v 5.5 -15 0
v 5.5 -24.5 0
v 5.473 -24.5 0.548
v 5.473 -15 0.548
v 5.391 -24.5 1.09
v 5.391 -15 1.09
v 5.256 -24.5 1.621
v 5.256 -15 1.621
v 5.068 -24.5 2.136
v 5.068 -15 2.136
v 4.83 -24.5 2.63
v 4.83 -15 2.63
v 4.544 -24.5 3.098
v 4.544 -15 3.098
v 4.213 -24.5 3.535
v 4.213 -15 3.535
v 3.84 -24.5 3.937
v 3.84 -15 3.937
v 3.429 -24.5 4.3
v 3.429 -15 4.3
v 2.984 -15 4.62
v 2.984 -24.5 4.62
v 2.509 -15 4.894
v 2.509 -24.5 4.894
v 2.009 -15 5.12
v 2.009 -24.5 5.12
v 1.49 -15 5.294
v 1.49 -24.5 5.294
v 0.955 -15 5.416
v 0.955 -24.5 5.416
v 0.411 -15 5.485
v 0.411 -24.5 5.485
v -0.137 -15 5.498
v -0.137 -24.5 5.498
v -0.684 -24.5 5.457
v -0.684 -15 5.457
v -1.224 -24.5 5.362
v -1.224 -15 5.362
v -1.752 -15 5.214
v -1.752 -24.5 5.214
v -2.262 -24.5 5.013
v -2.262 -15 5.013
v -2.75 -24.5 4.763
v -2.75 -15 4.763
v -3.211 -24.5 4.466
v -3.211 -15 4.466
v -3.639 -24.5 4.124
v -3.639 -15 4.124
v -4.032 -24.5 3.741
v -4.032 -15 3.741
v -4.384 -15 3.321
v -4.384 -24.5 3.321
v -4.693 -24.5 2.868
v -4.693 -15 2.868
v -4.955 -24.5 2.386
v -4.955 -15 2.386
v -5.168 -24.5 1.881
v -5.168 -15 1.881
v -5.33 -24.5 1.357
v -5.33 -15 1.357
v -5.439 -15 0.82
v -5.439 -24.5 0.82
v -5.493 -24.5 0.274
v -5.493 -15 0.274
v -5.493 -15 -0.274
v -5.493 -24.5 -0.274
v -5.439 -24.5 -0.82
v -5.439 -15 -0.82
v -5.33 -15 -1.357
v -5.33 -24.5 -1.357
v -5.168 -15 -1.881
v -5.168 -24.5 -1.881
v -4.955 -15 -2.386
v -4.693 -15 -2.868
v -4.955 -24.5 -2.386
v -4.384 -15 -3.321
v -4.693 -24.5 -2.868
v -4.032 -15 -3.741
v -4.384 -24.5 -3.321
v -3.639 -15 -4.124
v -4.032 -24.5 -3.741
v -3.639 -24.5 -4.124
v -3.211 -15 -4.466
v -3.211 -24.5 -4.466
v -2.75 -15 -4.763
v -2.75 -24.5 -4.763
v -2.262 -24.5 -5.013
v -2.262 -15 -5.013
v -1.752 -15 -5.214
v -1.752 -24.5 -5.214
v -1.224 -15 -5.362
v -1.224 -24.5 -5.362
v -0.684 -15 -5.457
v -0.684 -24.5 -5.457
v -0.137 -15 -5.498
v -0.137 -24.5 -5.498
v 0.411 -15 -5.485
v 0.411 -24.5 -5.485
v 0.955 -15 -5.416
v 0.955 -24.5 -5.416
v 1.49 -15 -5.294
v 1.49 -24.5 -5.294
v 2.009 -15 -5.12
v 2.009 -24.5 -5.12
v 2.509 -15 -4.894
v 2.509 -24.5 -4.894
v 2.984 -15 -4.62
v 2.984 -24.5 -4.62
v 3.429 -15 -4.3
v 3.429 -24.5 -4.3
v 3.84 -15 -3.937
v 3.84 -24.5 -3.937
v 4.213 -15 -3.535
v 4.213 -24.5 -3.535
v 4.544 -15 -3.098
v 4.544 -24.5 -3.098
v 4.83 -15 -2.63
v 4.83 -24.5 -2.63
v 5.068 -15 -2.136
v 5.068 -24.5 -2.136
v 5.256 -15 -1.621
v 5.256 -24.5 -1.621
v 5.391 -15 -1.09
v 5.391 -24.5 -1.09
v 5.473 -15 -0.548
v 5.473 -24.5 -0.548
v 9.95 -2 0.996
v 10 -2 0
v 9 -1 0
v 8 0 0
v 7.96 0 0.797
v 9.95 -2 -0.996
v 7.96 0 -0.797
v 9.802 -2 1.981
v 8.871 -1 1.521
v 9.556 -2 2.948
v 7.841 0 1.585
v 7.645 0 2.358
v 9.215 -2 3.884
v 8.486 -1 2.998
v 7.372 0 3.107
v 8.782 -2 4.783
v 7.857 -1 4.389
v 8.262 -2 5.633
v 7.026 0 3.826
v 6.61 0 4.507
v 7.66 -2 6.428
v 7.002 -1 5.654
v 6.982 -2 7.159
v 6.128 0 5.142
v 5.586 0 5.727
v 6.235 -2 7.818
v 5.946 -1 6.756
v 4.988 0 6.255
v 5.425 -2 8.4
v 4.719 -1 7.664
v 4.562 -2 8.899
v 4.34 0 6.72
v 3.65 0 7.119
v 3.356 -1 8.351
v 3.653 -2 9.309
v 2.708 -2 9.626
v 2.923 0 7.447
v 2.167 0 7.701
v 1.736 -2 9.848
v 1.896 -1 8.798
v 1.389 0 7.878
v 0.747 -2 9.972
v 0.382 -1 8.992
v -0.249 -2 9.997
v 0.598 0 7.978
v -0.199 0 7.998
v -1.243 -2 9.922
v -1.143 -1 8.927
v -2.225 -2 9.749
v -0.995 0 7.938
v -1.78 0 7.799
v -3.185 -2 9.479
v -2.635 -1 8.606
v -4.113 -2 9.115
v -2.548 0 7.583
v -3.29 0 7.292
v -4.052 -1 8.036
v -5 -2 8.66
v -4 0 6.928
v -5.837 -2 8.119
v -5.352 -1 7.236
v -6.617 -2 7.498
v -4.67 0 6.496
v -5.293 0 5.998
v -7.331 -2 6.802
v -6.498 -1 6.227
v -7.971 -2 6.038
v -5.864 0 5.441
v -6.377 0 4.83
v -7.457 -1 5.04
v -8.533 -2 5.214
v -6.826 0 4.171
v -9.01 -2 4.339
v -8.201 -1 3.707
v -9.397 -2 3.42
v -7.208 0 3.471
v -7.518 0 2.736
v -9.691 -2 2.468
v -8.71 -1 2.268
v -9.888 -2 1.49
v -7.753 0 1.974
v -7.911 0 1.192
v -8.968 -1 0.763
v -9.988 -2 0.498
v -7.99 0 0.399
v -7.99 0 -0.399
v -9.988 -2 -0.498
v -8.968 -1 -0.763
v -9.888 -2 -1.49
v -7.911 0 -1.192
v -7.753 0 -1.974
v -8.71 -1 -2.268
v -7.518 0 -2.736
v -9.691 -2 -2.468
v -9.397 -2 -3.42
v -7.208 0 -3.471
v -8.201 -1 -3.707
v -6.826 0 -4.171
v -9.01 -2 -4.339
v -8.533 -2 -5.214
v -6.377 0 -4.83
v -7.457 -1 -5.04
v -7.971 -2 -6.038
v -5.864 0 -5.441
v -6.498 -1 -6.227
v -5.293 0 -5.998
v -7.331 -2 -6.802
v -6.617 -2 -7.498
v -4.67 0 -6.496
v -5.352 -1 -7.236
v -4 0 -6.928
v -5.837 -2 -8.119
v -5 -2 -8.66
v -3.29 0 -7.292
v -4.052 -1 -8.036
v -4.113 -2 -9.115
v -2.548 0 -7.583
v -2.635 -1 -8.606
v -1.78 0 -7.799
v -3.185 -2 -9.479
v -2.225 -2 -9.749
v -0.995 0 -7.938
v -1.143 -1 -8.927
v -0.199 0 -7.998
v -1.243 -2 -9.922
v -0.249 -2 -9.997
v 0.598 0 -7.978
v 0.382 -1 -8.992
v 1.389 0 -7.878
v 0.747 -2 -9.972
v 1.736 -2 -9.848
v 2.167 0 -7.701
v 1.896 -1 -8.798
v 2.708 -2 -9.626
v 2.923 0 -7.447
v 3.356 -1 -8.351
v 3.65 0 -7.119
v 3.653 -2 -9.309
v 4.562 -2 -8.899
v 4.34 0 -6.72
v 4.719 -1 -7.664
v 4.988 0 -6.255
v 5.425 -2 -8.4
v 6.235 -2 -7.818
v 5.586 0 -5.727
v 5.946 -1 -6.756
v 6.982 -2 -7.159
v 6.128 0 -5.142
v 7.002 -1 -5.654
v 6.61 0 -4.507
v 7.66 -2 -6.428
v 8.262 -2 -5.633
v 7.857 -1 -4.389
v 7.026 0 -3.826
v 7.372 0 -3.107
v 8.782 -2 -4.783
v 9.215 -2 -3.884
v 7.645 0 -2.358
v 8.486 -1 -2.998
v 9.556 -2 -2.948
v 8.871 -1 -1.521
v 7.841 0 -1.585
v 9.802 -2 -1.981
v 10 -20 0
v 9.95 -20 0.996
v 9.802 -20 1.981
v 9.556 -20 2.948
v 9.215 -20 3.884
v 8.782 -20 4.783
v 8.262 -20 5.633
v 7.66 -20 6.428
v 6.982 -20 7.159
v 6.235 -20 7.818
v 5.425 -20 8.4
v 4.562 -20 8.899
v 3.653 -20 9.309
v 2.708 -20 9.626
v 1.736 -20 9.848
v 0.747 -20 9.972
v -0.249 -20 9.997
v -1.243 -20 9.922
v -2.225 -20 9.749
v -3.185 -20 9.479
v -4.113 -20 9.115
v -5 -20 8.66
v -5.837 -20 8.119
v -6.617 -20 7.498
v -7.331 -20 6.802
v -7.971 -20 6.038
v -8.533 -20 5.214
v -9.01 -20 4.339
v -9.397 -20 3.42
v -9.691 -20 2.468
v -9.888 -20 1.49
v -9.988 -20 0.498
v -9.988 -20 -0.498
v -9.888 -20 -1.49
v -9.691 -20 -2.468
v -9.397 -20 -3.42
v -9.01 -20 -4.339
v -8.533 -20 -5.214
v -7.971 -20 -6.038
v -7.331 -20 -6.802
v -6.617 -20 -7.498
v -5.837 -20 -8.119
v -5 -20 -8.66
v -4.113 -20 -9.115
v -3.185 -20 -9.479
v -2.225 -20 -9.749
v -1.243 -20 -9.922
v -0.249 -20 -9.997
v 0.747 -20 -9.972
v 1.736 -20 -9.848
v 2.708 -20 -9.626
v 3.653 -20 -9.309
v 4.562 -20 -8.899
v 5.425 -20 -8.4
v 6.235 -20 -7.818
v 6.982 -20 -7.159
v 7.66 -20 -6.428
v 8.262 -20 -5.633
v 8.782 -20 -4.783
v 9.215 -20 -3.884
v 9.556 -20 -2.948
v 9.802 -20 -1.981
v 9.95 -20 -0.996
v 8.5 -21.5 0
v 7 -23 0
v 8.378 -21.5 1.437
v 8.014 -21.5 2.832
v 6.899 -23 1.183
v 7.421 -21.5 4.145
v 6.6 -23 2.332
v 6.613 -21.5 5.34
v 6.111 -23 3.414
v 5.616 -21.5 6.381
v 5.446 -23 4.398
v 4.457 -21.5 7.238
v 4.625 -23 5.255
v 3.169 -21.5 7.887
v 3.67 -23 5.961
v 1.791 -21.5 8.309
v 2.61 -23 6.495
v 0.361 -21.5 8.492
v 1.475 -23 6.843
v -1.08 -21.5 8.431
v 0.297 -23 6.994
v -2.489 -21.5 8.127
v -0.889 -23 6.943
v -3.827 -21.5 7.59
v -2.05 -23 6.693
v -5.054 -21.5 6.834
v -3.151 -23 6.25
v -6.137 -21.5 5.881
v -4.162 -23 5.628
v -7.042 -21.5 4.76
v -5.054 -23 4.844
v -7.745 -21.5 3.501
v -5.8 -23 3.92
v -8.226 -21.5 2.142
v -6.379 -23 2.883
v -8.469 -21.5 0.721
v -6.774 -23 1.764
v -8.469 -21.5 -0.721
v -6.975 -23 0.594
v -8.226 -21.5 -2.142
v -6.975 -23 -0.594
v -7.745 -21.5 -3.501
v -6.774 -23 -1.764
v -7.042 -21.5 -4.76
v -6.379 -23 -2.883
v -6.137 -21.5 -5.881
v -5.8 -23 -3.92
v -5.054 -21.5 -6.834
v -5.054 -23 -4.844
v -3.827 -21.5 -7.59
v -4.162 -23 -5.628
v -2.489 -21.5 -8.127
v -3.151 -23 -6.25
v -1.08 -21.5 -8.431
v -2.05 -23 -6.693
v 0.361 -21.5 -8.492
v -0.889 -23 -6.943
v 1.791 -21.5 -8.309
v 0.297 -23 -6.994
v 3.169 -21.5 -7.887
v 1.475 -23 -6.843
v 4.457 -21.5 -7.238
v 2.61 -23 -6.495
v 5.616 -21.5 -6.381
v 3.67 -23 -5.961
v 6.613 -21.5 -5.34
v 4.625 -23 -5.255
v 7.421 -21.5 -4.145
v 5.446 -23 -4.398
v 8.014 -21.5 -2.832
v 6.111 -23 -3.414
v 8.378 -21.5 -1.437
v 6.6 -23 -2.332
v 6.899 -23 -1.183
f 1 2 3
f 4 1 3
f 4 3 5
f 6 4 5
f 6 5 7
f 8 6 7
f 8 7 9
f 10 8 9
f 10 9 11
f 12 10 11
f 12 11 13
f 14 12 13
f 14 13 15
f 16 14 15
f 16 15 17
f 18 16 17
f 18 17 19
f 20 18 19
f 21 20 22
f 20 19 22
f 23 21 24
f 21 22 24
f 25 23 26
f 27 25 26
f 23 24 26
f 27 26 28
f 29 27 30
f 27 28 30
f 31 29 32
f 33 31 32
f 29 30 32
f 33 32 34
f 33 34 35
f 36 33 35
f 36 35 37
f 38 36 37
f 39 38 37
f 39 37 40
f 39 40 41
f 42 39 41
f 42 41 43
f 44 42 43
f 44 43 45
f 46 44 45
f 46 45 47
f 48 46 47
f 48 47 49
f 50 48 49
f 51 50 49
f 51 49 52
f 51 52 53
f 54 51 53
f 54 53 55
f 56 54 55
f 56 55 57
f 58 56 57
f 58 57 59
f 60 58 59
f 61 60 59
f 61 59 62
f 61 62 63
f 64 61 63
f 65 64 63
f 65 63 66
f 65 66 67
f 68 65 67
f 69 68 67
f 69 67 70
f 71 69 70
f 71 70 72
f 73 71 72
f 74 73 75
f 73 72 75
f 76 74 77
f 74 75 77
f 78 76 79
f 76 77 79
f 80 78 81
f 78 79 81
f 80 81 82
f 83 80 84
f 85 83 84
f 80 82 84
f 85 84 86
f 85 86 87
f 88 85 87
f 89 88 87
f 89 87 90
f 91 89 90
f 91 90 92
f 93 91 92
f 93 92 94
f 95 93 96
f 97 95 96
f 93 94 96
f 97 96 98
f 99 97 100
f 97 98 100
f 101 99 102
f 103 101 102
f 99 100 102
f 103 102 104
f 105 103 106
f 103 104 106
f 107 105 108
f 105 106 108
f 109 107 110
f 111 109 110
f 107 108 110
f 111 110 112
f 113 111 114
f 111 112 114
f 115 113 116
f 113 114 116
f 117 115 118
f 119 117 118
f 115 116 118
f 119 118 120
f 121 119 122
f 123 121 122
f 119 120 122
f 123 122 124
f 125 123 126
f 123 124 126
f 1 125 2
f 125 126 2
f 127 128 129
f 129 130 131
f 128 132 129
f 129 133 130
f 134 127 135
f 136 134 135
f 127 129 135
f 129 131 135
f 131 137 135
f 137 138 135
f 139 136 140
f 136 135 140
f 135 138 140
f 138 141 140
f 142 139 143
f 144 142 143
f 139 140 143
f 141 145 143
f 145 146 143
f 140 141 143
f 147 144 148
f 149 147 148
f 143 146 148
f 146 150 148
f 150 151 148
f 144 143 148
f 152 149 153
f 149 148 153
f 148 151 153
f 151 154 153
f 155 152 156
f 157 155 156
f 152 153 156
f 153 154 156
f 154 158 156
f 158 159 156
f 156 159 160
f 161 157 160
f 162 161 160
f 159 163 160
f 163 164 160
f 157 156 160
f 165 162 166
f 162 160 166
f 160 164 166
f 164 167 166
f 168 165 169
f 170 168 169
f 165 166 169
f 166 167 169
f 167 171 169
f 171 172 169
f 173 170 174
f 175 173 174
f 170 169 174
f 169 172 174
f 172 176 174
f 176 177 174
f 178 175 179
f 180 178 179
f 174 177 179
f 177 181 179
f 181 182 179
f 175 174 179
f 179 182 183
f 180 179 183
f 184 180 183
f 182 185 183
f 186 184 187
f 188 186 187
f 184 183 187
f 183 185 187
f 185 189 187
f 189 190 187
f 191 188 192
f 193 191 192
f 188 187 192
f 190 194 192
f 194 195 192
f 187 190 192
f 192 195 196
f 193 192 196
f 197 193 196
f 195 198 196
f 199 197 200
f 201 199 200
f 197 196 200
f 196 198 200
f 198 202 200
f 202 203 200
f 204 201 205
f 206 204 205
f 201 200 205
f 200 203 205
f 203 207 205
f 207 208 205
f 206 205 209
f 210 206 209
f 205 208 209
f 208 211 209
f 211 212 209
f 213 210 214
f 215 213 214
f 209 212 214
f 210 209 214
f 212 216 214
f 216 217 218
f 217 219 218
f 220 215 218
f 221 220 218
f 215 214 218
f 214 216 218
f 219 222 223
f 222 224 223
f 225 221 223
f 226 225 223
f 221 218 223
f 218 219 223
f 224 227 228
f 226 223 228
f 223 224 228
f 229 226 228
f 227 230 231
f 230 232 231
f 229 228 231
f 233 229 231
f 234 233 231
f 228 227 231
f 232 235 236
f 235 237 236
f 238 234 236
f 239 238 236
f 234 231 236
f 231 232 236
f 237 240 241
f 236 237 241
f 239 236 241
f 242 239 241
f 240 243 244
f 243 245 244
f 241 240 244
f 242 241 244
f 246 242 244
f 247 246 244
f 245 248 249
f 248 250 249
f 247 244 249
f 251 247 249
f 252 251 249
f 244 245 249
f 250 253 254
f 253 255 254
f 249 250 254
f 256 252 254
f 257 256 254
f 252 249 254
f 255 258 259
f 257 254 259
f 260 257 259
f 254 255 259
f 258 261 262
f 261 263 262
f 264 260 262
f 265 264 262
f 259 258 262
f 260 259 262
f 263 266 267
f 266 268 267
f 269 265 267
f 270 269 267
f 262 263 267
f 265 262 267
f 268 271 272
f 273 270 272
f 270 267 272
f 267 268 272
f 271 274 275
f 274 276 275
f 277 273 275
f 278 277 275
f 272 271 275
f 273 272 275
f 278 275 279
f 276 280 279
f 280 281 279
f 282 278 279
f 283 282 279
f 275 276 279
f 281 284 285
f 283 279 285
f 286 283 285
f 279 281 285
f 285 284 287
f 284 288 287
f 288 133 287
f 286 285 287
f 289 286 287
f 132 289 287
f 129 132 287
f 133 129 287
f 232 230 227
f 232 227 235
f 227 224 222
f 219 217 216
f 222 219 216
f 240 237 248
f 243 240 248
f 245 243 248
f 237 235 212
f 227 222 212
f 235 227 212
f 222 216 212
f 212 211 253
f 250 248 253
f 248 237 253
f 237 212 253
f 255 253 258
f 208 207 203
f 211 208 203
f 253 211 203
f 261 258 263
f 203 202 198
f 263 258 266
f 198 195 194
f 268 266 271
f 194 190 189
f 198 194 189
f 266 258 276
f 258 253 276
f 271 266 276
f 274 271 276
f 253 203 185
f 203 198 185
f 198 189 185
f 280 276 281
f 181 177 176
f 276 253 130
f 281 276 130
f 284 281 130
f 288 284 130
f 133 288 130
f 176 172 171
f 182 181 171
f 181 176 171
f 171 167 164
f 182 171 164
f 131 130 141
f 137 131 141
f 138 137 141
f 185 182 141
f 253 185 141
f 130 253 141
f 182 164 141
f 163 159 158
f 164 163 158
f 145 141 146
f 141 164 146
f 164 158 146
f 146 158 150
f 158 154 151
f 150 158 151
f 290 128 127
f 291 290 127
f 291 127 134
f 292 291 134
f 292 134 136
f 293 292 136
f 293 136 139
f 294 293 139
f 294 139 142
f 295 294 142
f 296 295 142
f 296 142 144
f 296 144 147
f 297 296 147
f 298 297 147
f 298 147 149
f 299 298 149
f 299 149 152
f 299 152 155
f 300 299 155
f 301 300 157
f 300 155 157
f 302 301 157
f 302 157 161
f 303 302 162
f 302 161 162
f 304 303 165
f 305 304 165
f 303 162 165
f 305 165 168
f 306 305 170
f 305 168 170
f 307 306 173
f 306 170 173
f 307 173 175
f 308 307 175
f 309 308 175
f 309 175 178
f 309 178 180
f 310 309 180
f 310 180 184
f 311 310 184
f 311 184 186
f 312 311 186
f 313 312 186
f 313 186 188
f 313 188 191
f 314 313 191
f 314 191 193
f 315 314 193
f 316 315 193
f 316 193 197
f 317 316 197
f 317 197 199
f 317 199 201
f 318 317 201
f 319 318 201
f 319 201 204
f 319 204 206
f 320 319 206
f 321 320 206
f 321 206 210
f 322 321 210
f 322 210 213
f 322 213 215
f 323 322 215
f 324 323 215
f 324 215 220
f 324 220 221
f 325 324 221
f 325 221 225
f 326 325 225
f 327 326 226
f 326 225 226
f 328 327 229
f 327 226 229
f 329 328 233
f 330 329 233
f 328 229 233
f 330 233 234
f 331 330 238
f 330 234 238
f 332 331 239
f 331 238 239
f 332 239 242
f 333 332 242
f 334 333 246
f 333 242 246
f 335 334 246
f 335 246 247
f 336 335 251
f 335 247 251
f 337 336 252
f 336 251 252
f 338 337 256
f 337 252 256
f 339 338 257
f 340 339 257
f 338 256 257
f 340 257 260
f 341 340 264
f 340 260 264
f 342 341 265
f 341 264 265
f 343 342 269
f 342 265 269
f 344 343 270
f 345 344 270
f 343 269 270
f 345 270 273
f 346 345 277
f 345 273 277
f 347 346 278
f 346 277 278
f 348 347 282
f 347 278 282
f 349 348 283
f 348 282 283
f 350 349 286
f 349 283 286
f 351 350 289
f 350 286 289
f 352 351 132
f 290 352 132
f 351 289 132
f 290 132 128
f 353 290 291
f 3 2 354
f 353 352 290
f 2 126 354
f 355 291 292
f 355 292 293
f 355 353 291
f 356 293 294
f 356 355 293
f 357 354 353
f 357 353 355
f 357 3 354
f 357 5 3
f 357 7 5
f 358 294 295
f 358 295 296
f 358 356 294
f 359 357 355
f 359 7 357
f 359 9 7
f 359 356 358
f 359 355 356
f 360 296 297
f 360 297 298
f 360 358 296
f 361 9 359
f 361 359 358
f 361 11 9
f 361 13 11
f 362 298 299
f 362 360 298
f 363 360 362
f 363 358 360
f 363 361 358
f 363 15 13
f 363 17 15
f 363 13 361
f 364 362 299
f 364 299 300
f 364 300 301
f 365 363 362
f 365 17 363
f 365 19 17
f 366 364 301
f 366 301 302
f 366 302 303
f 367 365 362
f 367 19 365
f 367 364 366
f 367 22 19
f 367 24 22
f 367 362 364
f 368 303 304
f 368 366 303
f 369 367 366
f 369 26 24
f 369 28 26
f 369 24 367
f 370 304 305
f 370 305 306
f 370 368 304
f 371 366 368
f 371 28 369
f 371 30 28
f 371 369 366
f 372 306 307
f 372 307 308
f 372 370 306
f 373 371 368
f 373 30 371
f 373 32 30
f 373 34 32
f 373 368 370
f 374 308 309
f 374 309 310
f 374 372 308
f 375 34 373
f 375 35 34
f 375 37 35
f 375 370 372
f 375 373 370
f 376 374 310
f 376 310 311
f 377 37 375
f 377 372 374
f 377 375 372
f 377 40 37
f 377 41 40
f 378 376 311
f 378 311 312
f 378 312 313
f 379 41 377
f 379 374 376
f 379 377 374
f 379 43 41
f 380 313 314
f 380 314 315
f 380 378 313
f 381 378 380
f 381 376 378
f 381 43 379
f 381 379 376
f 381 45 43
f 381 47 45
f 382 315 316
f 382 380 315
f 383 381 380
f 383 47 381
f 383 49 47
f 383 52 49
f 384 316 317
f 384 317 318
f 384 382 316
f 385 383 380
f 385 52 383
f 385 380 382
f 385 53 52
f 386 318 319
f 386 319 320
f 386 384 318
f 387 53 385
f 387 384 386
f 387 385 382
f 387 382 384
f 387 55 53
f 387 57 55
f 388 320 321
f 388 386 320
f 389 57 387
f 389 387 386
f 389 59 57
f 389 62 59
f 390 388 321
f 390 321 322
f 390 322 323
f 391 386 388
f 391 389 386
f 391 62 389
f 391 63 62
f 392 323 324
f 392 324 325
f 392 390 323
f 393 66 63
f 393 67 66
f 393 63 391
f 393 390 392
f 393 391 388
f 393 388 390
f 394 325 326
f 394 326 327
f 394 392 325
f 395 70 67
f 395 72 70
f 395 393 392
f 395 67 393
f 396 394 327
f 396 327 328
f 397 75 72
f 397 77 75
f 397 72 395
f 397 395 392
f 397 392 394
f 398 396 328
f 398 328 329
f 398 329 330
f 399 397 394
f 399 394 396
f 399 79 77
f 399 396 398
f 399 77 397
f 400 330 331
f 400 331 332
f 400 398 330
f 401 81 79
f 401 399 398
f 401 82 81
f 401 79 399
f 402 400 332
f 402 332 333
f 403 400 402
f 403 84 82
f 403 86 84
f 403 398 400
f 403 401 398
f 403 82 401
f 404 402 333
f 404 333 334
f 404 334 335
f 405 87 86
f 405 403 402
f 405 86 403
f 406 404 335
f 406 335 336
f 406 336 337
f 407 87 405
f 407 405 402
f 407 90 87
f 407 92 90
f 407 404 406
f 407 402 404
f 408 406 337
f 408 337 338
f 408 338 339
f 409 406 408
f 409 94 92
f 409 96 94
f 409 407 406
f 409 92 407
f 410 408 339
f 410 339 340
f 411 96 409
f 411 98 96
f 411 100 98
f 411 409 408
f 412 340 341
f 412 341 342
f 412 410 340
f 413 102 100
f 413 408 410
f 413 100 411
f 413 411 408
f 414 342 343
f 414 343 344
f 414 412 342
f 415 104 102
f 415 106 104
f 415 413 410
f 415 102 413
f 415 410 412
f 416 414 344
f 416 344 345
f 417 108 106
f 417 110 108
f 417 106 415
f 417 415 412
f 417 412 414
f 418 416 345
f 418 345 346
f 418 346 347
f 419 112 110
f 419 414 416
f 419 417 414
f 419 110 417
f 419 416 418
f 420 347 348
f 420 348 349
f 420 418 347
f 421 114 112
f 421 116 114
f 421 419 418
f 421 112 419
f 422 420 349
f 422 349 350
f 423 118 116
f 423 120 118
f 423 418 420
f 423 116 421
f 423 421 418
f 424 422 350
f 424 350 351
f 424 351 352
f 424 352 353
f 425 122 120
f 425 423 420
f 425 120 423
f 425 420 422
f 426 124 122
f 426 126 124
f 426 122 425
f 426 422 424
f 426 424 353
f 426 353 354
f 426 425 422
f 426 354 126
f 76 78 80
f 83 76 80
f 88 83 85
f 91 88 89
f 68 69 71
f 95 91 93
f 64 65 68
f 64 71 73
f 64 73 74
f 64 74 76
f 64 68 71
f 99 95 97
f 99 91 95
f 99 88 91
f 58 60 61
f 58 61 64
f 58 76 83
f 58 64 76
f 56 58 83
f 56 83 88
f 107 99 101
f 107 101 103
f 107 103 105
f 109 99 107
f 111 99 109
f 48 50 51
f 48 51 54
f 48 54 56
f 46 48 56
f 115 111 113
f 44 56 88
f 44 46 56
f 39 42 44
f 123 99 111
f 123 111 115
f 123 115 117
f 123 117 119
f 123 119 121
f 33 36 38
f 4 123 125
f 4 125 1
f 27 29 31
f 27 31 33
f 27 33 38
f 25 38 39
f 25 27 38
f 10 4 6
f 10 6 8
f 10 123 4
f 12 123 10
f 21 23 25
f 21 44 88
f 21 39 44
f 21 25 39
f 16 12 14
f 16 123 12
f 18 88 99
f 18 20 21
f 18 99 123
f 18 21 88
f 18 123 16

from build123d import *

# Parameters (mm, degrees)
F0_R     = 10
F1_DEPTH = 25
F2_R     = 5.5
F3_DEPTH = 10
F4_SIZE  = 2


# Not quite as in the source:
# - a fillet or chamfer that OpenCascade refuses, or shapes differently, is made with other operations: its cross-section is extruded or revolved along the edge and cut away or added


with BuildPart() as f1:
    # F0 (on Front) → F1 (new body)
    with BuildSketch(Plane.XZ):
        Circle(F0_R)
    extrude(amount=F1_DEPTH)

    # F2 (on face) → F3 (cut)
    with BuildSketch(Plane.XZ.offset(25)):
        Circle(F2_R)
    extrude(amount=-F3_DEPTH, mode=Mode.SUBTRACT)

    # F4
    f4_edges = [f1.edges().sort_by_distance(p)[0] for p in [
        (-10, 0, 0),
    ]]
    chamfer(f4_edges, length=F4_SIZE)

    # F5: chamfer of 5 on 1 edges, made by hand

    # F5_s1 → F5_t2 (revolve, cut)
    with BuildSketch(Plane.XY):
        Polygon((10, -20), (5, -25), (10, -25), align=None)
    revolve(axis=Axis((0, -25, 0), (0, -1, 0)), mode=Mode.SUBTRACT)


solid = f1.part
